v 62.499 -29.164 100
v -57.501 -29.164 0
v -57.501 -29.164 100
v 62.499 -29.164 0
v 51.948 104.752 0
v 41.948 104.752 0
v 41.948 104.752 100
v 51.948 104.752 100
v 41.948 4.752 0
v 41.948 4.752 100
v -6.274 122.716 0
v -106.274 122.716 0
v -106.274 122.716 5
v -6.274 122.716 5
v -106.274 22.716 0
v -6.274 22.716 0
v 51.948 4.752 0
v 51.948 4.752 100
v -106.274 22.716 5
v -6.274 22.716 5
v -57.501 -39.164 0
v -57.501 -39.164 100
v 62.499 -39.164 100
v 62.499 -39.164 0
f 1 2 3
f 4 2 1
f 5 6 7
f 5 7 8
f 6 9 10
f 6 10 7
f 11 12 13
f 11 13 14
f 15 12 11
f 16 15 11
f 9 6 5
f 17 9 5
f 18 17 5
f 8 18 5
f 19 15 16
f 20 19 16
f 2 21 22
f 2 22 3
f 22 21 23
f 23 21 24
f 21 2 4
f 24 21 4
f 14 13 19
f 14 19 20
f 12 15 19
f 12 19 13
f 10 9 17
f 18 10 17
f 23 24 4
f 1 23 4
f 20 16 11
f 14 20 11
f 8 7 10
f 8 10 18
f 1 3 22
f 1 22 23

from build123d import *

# Parameters (mm, degrees)
F0_W     = 100
F0_H     = 100
F1_DEPTH = 5
F3_W     = 120
F3_H     = 10
F4_DEPTH = 100
F2_W     = 10
F2_H     = 100
F5_DEPTH = 100


with BuildPart() as f1:
    # F0 (on Top) → F1 (new body)
    with BuildSketch(Plane.XY):
        with Locations((-56.27404, 72.716347)):
            Rectangle(F0_W, F0_H)
    extrude(amount=F1_DEPTH)


with BuildPart() as f4:
    # F3 (on Top) → F4 (new body)
    with BuildSketch(Plane.XY):
        with Locations((2.498968, -34.163917)):
            Rectangle(F3_W, F3_H)
    extrude(amount=F4_DEPTH)


with BuildPart() as f5:
    # F2 (on Top) → F5 (new body)
    with BuildSketch(Plane.XY):
        with Locations((46.94775, 54.751927)):
            Rectangle(F2_W, F2_H)
    extrude(amount=F5_DEPTH)


solid = Compound([f1.part, f4.part, f5.part])
